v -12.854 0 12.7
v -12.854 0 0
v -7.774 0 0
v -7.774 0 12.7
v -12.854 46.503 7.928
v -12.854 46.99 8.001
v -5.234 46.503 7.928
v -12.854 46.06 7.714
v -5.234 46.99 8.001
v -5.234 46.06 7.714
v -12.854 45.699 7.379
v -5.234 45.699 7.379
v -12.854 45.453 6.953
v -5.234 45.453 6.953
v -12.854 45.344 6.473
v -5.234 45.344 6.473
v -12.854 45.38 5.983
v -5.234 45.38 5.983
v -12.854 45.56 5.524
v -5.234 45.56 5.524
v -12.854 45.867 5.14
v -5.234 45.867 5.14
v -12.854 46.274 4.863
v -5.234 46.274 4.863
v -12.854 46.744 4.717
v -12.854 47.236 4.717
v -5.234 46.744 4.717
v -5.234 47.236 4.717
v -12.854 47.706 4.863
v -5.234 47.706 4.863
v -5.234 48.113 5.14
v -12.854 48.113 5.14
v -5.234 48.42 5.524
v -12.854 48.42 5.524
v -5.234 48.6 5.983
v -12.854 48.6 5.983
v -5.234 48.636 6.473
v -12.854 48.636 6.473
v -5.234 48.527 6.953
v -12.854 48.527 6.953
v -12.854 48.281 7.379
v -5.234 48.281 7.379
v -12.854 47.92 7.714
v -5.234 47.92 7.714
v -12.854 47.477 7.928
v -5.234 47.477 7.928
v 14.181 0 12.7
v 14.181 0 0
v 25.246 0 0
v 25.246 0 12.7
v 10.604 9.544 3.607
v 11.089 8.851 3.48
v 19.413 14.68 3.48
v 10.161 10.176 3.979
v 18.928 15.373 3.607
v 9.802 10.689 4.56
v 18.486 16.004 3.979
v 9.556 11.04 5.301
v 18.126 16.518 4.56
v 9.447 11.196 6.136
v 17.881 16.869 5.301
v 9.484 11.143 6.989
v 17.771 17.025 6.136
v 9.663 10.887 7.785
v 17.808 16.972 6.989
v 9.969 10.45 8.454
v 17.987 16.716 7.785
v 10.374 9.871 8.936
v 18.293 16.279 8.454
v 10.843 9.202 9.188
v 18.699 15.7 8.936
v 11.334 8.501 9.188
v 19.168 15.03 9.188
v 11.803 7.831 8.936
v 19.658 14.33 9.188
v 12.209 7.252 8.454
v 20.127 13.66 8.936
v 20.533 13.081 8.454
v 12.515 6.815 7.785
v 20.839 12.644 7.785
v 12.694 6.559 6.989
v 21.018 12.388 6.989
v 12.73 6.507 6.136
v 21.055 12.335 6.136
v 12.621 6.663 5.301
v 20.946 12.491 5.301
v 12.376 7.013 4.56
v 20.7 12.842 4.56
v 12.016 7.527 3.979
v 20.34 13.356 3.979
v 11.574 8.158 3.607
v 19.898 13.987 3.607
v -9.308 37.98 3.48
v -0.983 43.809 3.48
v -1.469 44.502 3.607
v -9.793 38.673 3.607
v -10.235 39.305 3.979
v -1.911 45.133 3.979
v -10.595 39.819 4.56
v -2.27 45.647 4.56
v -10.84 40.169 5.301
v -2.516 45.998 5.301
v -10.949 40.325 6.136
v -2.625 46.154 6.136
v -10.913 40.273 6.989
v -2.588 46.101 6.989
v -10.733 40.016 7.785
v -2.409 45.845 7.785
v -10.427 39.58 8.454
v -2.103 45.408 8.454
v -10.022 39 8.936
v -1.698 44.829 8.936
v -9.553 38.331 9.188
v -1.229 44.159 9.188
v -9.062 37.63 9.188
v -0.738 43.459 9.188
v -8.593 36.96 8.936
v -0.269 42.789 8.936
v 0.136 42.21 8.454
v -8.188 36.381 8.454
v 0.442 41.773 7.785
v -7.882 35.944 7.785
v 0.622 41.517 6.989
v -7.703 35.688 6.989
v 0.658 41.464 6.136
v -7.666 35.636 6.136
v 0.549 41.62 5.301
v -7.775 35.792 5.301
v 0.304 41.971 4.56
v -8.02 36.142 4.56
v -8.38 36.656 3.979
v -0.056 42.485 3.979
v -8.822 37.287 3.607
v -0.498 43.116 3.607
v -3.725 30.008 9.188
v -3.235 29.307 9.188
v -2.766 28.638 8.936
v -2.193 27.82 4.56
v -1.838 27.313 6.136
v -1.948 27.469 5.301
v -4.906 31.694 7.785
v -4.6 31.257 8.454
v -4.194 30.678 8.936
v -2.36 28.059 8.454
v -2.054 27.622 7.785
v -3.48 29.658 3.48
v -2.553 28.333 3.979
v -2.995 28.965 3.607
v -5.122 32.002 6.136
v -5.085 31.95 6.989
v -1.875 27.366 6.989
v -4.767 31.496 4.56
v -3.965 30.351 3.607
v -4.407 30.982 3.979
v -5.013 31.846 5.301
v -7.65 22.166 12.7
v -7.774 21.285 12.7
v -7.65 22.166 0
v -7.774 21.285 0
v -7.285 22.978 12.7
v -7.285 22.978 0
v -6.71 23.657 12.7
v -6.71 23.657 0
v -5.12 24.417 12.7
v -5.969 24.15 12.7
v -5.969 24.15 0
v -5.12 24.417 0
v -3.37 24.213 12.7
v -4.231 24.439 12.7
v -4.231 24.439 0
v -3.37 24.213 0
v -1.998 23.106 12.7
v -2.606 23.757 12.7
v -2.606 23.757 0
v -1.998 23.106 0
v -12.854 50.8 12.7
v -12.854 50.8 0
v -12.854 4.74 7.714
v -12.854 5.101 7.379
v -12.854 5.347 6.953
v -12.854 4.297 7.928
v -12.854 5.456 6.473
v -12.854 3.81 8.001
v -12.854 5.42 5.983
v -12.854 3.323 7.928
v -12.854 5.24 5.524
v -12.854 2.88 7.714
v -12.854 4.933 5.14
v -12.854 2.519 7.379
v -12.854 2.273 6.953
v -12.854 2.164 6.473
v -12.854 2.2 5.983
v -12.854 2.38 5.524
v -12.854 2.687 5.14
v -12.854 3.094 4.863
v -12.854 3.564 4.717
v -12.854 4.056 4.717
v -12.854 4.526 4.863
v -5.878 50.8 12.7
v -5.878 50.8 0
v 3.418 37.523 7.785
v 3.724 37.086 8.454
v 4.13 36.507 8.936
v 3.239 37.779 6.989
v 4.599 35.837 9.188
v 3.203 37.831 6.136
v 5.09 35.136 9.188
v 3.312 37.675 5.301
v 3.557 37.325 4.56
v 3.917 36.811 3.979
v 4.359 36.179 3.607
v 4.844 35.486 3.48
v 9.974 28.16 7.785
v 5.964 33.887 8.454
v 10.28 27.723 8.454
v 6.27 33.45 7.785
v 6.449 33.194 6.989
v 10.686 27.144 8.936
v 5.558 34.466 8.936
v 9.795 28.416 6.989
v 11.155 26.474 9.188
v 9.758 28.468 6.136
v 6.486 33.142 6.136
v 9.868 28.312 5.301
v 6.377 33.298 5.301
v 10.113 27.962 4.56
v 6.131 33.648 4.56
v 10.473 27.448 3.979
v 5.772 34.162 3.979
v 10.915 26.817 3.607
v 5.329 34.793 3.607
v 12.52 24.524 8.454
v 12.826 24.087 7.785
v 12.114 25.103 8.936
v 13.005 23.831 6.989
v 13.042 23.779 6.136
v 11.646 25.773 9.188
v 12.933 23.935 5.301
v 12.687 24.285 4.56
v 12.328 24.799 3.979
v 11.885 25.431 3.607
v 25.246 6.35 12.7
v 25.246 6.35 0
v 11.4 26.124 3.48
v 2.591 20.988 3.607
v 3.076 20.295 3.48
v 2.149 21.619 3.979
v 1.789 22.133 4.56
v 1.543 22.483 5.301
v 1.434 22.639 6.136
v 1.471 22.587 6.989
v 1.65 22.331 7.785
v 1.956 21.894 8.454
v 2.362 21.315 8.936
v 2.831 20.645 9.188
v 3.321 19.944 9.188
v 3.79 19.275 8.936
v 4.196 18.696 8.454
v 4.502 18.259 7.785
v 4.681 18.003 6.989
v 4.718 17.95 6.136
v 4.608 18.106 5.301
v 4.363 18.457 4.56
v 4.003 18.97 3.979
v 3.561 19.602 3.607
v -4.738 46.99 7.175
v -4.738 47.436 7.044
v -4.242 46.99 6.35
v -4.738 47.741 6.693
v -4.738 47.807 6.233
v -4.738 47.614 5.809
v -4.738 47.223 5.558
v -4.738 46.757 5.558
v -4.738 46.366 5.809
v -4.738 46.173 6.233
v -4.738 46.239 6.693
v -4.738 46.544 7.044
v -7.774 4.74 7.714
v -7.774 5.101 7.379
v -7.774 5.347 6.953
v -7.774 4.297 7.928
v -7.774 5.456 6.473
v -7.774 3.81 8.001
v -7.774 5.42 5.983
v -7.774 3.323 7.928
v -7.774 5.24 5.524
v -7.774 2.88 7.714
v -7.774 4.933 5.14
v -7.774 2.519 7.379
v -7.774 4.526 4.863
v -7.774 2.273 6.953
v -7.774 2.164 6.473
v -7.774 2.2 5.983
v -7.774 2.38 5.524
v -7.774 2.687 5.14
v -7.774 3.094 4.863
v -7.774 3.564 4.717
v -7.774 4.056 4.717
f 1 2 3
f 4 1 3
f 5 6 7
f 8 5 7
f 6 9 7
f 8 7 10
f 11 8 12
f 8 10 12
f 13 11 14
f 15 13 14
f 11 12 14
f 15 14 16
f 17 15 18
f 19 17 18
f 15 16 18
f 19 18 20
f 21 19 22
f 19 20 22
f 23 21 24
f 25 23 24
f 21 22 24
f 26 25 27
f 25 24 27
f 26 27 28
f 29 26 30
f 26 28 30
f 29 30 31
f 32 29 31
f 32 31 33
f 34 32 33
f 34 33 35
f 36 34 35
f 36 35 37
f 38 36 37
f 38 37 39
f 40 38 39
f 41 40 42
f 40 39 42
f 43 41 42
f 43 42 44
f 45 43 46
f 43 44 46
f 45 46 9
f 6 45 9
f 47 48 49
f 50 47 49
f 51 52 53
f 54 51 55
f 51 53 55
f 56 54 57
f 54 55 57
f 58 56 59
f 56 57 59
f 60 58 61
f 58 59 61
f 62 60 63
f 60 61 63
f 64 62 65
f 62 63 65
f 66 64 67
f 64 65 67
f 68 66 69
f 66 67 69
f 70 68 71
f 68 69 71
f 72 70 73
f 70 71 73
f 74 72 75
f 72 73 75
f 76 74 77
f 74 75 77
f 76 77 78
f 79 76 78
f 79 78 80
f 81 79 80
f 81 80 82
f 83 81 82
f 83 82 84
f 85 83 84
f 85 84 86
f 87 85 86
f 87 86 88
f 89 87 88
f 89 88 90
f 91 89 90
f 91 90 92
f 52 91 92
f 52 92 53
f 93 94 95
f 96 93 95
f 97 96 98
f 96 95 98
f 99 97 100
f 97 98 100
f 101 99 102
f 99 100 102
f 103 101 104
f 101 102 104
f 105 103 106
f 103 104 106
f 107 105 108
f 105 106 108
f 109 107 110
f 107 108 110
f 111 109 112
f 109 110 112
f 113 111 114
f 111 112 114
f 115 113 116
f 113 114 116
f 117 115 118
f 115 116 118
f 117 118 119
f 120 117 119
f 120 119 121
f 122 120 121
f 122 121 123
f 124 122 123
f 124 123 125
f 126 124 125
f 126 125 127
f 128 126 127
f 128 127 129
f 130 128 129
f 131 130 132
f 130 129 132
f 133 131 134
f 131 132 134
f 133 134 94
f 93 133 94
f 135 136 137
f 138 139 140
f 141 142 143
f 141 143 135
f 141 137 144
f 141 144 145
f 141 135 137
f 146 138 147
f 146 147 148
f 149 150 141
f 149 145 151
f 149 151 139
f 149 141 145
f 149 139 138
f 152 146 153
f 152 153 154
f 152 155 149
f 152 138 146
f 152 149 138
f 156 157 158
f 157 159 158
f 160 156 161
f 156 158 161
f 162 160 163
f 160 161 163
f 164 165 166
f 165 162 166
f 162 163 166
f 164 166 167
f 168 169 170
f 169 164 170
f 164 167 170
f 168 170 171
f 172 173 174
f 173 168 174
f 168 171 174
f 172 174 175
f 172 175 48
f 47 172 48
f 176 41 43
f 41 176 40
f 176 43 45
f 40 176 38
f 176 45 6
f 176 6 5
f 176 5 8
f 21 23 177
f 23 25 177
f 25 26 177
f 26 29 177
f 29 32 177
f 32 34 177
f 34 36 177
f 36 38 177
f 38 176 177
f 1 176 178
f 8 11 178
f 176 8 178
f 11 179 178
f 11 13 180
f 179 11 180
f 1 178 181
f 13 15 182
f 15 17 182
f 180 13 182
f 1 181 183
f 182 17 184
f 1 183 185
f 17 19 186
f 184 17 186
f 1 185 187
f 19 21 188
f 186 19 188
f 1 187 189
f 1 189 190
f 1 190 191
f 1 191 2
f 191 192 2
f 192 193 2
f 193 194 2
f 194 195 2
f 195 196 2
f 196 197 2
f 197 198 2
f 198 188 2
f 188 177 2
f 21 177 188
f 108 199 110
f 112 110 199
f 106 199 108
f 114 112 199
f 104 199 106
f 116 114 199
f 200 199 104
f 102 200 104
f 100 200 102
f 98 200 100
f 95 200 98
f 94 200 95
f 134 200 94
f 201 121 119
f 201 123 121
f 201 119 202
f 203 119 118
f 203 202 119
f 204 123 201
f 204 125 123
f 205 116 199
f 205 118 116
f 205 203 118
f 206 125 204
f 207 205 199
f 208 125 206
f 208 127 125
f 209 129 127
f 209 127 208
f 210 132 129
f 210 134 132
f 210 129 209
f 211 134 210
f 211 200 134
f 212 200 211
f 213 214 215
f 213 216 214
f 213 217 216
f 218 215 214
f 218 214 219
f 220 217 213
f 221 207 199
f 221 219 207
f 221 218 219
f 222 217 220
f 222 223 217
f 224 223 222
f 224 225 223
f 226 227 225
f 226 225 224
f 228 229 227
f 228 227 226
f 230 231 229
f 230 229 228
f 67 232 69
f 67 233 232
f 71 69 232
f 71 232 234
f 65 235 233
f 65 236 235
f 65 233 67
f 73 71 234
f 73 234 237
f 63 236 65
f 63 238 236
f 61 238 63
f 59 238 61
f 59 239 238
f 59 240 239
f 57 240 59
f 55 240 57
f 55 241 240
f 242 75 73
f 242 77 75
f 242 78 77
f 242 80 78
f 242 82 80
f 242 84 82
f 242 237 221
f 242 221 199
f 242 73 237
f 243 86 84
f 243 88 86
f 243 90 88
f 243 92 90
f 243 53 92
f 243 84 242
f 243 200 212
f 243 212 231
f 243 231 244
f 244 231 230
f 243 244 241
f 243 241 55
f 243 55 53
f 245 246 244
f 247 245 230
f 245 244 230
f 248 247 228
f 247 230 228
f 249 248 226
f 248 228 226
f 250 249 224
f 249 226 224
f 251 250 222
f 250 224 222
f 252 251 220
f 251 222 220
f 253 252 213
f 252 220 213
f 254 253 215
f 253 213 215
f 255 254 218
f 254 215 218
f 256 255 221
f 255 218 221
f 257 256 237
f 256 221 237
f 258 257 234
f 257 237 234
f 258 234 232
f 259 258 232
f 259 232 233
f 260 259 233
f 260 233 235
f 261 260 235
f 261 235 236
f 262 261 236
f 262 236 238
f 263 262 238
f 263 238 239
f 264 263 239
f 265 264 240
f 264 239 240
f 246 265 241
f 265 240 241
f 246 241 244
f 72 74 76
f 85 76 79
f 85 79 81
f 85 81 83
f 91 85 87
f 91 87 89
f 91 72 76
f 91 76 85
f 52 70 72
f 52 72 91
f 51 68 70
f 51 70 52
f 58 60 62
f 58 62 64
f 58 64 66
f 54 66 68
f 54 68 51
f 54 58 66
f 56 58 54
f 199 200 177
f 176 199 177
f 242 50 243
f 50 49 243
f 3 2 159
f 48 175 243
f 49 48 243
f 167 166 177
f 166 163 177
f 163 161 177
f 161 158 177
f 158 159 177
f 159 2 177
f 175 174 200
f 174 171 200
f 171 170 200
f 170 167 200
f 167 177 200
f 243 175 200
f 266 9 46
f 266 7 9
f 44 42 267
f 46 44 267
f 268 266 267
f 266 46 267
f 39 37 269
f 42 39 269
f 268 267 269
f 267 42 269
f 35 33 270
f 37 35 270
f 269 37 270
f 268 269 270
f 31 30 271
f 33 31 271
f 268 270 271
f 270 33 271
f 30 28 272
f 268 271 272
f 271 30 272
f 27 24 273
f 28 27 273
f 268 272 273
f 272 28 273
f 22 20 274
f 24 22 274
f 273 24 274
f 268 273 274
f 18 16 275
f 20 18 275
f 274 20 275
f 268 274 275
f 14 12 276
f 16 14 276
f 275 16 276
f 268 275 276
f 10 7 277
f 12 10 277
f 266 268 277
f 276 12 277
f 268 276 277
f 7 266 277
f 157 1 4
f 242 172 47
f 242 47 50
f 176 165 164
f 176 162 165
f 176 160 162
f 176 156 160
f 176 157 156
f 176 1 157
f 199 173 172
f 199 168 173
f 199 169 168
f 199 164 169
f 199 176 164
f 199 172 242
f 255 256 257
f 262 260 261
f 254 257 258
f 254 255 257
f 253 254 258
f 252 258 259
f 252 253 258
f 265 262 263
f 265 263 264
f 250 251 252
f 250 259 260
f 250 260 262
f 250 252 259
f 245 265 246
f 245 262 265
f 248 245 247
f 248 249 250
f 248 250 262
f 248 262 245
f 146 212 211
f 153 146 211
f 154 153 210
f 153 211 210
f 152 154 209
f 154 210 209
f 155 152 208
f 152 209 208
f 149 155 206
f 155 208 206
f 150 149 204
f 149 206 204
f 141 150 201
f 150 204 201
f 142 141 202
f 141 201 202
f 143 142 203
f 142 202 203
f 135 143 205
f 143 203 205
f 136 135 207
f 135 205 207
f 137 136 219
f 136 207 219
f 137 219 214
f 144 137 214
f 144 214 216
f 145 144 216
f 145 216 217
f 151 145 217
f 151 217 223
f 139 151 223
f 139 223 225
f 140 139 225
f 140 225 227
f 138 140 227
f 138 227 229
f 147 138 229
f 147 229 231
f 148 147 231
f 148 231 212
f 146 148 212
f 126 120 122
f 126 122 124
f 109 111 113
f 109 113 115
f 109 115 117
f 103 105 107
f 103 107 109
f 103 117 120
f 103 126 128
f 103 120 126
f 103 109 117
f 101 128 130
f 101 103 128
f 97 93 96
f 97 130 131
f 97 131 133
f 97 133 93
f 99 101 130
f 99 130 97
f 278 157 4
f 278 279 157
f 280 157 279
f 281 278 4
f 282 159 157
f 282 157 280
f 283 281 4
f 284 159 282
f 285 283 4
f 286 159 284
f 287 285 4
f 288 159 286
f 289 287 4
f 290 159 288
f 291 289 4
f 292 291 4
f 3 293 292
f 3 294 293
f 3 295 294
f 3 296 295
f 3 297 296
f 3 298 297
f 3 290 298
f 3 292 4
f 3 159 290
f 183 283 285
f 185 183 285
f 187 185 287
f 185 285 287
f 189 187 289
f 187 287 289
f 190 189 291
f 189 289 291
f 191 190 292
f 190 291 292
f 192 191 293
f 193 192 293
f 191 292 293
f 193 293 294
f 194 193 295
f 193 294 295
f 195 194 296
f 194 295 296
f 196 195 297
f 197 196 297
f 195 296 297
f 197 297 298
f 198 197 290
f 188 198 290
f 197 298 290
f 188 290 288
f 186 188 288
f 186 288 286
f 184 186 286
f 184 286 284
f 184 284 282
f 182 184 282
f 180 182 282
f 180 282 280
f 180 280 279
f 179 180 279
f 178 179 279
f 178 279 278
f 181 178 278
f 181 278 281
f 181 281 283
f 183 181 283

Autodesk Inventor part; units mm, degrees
ref_plane "YZ Plane" through (0, 0, 0) normal (1, 0, 0) x (0, 1, 0)
ref_plane "XZ Plane" through (0, 0, 0) normal (0, 1, 0) x (-1, 0, 0)
ref_plane "XY Plane" through (0, 0, 0) normal (0, 0, 1) x (1, 0, 0)
sketch "Sketch1" plane through (0, 0, 0) normal (0, 0, 1) x (1, 0, 0)
  line L0 (-12.8542, 0) -> (25.2458, 0)
  line L1 (25.2458, 0) -> (25.2458, 50.8)
  line L2 (25.2458, 50.8) -> (-12.8542, 50.8)
  line L3 (-12.8542, 50.8) -> (-12.8542, 0)
  circle A0 centre (-4.5992, 21.2852) radius 3.175
  line L4 (-7.7742, 21.2852) -> (-7.7742, 0)
  line L5 (-1.9984, 23.1063) -> (14.1808, 0)
  line L6 (-5.8785, 50.8) -> (25.2458, 6.35)
  point P0 (0, 0)
  dimension "d0" = 38.1
  dimension "d1" = 50.8
  dimension "d2" = 6.35
  dimension "d3" = 8.255
  dimension "d4" = 21.2852
  dimension "d5" = 6.35
  dimension "d6" = 35
extrude "Extrusion1" add sketch "Sketch1" along normal blind 12.7 contours L3 L2 L6 L1 L0 L5 A0 L4
sketch "Sketch2" plane through (-5.8785, 50.8, 12.7) normal (0.8192, 0.5736, 0) x (0, 0, -1)
  circle A0 centre (6.35, -8.5344) radius 2.8702
  circle A1 centre (6.35, -18.6944) radius 2.8702
  circle A2 centre (6.35, -30.1244) radius 2.8702
  circle A3 centre (6.35, -44.0944) radius 2.8702
  line L0 (12.7, 0) -> (0, 0) projected
  line L1 (12.7, -54.2634) -> (12.7, 0) projected
  point P0 (12.7, -44.9847)
  dimension "d9" = 5.7404
  dimension "d10" = 5.7404
  dimension "d11" = 5.7404
  dimension "d12" = 5.7404
  dimension "d13" = 8.5344
  dimension "d14" = 6.35
  dimension "d16" = 30.1244
  dimension "d17" = 44.0944
  dimension "d18" = 18.6944
extrude "Extrusion2" cut sketch "Sketch2" against normal blind 10.16
sketch "Sketch3" plane through (-12.8542, 0, 0) normal (-1, 0, 0) x (0, 0, 1)
  line L0 (0, 50.8) -> (0, 0) projected
  line L1 (0, 0) -> (12.7, 0) projected
  point P0 (6.35, 46.99)
  point P1 (6.35, 3.81)
  dimension "d21" = 6.35
  dimension "d22" = 6.35
  dimension "d23" = 46.99
  dimension "d24" = 3.81
hole "Hole1" at (-12.8542, 46.99, 6.35) at (-12.8542, 3.81, 6.35) direction (1, 0, 0) diameter 3.302 depth 7.62 tip angle 118 thread size "8-32 UNC" class "2B" standard "ANSI Unified Screw Threads"
equation "\"d10\" = d9"
equation "\"d11\" = d9"
equation "\"d12\" = d9"
properties part number "Punch Holder" material "Stainless Steel"
